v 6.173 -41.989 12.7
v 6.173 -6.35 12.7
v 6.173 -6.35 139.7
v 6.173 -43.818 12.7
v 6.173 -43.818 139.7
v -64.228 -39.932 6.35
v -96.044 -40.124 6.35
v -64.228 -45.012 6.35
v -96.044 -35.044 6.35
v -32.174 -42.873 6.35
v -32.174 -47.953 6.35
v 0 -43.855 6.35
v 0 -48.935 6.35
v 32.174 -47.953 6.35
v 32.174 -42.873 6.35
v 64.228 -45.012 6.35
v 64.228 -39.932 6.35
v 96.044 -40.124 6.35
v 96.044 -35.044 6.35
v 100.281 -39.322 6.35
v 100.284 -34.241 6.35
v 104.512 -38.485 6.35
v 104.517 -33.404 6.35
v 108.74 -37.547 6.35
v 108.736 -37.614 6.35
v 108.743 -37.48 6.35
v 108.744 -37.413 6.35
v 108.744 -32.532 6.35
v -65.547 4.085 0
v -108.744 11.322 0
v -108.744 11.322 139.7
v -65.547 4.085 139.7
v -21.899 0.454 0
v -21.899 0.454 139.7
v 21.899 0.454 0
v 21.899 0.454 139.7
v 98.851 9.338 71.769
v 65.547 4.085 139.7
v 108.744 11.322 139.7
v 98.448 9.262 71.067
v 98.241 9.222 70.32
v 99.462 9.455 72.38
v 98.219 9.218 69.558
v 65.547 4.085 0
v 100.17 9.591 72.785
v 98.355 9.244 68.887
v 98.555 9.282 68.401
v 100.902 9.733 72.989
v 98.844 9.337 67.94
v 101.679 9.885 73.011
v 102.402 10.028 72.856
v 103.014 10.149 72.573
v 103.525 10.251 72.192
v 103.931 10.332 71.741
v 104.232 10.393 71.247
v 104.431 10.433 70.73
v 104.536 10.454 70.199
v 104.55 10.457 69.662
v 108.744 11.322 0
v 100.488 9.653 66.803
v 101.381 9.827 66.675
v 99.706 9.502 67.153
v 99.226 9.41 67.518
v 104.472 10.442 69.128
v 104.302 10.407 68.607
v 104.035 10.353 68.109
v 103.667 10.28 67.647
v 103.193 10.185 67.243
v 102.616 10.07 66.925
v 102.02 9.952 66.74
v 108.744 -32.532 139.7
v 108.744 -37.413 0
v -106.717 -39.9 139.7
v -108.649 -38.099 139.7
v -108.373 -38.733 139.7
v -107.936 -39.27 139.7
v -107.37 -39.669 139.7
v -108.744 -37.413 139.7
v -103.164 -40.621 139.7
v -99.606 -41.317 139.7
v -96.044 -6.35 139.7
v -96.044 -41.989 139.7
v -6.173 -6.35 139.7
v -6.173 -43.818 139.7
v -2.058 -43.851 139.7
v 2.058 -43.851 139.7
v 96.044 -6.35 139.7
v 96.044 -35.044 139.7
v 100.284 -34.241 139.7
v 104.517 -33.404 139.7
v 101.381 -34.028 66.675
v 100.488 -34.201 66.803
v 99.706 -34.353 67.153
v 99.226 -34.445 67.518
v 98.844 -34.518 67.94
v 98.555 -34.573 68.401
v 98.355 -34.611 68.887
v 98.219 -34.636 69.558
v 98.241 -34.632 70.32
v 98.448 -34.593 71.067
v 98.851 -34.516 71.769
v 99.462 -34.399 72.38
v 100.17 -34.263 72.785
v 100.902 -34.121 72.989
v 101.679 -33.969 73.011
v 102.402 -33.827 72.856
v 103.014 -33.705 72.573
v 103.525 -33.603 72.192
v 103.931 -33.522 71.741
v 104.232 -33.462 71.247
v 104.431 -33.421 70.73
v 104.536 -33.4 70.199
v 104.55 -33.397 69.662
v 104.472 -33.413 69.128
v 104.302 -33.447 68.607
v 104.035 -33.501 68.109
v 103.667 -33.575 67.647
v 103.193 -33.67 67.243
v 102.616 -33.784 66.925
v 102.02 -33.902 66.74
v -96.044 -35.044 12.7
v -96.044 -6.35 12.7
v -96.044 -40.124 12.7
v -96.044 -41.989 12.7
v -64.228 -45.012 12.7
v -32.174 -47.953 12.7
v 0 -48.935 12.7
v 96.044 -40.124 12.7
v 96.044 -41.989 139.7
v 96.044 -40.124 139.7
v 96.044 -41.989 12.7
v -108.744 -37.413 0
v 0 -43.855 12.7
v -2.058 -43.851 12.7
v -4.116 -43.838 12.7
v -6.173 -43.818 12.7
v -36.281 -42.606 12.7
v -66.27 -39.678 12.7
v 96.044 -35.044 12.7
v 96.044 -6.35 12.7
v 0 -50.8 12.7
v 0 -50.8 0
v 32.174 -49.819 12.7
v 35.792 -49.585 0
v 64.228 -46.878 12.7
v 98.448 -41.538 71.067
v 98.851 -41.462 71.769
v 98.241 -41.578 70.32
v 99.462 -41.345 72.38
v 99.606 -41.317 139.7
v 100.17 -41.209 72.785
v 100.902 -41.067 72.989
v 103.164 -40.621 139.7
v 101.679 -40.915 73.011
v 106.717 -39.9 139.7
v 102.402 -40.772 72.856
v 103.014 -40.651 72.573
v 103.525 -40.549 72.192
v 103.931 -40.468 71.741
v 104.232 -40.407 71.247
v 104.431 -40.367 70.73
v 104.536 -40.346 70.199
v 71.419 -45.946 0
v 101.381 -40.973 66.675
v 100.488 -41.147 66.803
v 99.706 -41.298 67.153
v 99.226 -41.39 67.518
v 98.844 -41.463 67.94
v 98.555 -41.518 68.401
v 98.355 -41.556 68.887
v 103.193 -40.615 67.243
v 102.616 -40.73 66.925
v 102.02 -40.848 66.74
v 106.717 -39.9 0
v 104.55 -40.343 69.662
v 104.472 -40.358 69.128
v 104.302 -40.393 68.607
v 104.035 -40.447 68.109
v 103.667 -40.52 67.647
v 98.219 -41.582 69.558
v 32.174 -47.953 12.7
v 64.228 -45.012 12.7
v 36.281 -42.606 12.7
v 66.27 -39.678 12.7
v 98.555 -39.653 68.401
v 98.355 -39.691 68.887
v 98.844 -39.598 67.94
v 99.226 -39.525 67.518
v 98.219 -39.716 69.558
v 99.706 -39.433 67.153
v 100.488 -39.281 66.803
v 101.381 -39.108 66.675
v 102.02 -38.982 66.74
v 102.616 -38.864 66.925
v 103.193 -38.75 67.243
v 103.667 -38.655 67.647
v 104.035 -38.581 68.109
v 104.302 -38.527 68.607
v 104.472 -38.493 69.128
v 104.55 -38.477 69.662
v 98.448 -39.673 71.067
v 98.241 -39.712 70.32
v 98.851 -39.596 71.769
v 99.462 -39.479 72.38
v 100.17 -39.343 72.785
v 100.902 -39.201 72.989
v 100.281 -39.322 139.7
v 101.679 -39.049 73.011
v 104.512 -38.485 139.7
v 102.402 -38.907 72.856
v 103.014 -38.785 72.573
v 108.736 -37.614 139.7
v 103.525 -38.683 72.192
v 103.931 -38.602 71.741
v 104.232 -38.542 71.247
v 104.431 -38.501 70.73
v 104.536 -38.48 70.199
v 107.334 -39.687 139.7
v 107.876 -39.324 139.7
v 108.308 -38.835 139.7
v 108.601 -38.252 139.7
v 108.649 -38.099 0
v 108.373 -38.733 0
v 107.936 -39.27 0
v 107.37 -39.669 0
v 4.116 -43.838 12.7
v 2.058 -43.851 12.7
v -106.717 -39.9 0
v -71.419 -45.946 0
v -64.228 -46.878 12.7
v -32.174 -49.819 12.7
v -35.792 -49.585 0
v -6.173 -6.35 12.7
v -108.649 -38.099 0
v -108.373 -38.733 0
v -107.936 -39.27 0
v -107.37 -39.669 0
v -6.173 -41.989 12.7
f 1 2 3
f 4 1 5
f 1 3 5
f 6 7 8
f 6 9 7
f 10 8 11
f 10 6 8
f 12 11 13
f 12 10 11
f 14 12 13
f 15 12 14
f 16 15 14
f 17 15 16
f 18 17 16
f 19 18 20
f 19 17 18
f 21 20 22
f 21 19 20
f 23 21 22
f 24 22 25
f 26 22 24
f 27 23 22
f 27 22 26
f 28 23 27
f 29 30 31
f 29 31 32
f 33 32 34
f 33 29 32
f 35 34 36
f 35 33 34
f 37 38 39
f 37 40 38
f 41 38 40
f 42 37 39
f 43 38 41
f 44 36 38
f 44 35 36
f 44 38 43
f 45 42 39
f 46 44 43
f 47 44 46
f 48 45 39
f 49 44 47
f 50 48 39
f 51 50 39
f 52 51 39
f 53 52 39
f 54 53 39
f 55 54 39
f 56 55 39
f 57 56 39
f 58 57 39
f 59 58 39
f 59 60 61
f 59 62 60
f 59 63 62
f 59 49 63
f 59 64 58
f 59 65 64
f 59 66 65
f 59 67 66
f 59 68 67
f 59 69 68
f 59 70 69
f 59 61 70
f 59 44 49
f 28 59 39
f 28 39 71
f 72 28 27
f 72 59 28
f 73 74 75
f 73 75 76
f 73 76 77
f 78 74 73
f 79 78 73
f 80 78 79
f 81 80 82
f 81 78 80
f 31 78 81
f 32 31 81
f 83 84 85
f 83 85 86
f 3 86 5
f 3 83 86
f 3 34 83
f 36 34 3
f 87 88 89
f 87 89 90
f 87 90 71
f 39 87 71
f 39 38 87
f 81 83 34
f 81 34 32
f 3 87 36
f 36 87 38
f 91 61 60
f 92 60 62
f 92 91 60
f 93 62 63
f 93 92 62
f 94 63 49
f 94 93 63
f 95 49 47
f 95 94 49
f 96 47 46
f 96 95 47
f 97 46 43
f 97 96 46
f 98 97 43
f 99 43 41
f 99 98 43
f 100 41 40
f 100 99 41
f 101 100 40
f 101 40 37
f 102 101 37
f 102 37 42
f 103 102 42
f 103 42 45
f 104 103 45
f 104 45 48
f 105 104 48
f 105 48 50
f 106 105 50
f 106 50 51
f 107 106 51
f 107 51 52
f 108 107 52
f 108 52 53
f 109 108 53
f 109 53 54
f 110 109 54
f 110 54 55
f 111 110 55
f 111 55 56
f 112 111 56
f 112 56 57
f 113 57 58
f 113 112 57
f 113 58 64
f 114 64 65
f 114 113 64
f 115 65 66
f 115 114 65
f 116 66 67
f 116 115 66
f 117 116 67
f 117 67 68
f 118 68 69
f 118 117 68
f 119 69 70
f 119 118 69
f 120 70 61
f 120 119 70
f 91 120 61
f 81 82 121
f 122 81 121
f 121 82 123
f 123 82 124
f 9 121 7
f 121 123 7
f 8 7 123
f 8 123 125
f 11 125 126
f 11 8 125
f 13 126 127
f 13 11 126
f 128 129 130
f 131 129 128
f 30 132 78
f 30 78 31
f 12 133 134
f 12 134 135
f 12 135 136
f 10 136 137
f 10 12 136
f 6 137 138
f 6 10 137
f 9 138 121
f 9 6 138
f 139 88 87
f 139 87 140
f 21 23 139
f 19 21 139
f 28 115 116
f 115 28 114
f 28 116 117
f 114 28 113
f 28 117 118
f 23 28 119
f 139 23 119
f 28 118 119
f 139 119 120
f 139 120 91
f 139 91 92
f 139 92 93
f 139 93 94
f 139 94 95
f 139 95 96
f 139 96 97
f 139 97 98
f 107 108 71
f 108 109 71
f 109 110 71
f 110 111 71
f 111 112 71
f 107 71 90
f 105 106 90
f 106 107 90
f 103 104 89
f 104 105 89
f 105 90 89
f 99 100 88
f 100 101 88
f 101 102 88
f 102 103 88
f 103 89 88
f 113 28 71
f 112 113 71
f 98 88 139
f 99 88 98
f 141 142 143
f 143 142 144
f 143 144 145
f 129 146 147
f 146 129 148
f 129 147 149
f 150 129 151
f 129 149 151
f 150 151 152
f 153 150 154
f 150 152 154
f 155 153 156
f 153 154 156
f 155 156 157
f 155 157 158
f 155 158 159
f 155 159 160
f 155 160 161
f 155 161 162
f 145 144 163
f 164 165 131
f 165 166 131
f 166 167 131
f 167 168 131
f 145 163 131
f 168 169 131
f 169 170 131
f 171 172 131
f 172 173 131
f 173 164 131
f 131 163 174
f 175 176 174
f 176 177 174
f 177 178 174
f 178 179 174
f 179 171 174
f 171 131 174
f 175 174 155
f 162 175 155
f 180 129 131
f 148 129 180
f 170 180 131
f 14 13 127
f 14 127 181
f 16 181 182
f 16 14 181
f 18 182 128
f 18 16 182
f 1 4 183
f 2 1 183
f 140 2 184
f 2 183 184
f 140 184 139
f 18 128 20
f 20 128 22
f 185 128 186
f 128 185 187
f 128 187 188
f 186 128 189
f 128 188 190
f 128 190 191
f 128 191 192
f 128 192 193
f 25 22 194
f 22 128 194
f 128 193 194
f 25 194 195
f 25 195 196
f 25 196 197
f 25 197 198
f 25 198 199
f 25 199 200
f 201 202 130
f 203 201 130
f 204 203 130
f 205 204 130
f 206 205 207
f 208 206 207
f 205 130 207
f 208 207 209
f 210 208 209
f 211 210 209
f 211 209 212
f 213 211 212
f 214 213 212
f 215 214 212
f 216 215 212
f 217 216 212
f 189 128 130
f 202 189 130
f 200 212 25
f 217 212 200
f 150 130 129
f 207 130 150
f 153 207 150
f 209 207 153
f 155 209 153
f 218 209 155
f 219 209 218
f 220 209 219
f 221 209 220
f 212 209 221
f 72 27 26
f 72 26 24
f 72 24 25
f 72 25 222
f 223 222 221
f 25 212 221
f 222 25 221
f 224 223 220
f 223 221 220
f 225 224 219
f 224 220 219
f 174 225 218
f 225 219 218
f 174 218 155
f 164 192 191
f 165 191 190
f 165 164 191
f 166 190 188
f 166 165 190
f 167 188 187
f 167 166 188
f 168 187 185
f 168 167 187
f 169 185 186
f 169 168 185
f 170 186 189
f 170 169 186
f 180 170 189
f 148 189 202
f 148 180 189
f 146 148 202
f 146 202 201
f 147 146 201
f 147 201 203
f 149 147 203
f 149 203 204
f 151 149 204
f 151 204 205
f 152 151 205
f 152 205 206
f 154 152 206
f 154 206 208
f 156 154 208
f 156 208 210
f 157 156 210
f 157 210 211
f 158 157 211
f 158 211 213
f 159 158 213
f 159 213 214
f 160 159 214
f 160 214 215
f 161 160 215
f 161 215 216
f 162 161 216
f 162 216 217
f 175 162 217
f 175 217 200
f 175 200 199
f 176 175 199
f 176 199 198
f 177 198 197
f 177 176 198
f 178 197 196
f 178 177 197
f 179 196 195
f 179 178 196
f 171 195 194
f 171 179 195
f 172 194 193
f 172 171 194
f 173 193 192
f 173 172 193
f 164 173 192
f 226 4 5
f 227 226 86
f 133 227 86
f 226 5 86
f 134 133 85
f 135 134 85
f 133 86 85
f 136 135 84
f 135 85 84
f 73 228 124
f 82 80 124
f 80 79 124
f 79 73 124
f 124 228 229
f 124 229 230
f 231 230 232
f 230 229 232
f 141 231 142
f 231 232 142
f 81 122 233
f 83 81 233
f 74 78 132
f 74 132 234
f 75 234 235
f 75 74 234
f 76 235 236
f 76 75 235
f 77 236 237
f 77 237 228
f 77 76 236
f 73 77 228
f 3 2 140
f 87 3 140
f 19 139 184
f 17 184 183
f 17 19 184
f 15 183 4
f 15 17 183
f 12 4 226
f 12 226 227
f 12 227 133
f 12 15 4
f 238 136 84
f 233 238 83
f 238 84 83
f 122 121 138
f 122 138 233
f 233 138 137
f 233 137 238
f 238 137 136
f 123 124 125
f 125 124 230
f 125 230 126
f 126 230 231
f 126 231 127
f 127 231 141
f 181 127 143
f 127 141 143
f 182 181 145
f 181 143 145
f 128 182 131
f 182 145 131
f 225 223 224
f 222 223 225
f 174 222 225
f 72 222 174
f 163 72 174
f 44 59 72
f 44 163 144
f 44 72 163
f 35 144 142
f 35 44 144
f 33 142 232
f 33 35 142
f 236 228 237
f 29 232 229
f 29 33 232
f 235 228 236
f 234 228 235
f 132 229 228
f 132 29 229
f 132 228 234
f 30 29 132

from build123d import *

# Parameters (mm, degrees)
BOSS_EXTRUDE2_DEPTH     = 279.4
CUT_EXTRUDE1_DEPTH      = 279.4
FILLET1_R               = 2.54
SKETCH7_W               = 192.0875
SKETCH7_H               = 254
CUT_EXTRUDE2_DEPTH      = 44.45
SKETCH8_W               = 6.173248721
SKETCH8_H               = 35.639061591
BOSS_EXTRUDE3_DEPTH     = 258.064
CUT_EXTRUDE3_DEPTH      = 260.35
CUT_EXTRUDE3_DEPTH_BACK = 6.35
CUT_EXTRUDE4_DEPTH      = 260.35
CUT_EXTRUDE4_DEPTH_BACK = 6.35
BOSS_EXTRUDE4_DEPTH     = 254
SKETCH18_R              = 3.175
CUT_EXTRUDE5_DEPTH      = 71.12


with BuildPart() as part:
    # CrossSection → Boss-Extrude2 (new body)
    with BuildSketch(Plane.XY):
        with BuildLine():
            Line((108.74375, 11.322324676), (108.74375, -50.8))
            Line((108.74375, -50.8), (-108.74375, -50.8))
            Line((-108.74375, -50.8), (-108.74375, 11.322324676))
            ThreePointArc((-108.74375, 11.322324676), (0, 0), (108.74375, 11.322324676))
        make_face()
    extrude(amount=BOSS_EXTRUDE2_DEPTH)

    # Sketch4 → Cut-Extrude1 (cut)
    with BuildSketch(Plane(origin=(0, 0, 0), x_dir=(-1, 0, 0), z_dir=(0, 0, -1))):
        with BuildLine():
            ThreePointArc((0, -50.8), (-54.665798723, -47.96178867), (-108.74375, -39.477675324))
            Line((-108.74375, -39.477675324), (-108.74375, -50.8))
            Line((-108.74375, -50.8), (0, -50.8))
        make_face()
        with BuildLine():
            ThreePointArc((108.74375, -39.477675324), (54.665798723, -47.96178867), (0, -50.8))
            Line((0, -50.8), (108.74375, -50.8))
            Line((108.74375, -50.8), (108.74375, -39.477675324))
        make_face()
    extrude(amount=-CUT_EXTRUDE1_DEPTH, mode=Mode.SUBTRACT)

    # Fillet1
    fillet1_edges = [part.edges().sort_by_distance(p)[0] for p in [
        (108.74375, -39.477675324, 139.7),
        (-108.74375, -39.477675324, 139.7),
    ]]
    fillet(fillet1_edges, radius=FILLET1_R)

    # Sketch7 → Cut-Extrude2 (cut)
    with BuildSketch(Plane(origin=(0, -50.8, 0), x_dir=(1, 0, 0), z_dir=(0, 1, 0))):
        with Locations((0, -139.7)):
            Rectangle(SKETCH7_W, SKETCH7_H)
    extrude(amount=CUT_EXTRUDE2_DEPTH, mode=Mode.SUBTRACT)

    # Sketch8 → Boss-Extrude3 (add)
    with BuildSketch(Plane.XY.offset(12.7)):
        with Locations((3.086624361, -24.169530796)):
            Rectangle(SKETCH8_W, SKETCH8_H)
        with Locations((-3.086624361, -24.169530796)):
            Rectangle(SKETCH8_W, SKETCH8_H)
    extrude(amount=BOSS_EXTRUDE3_DEPTH)

    # Sketch13 → Cut-Extrude3 (cut, two sides: drawn at the far end of the back side and taken through both)
    with BuildSketch(Plane.XY.offset(12.7).offset(-CUT_EXTRUDE3_DEPTH_BACK)):
        with BuildLine():
            ThreePointArc((-96.04375, -40.123592373), (-48.223527841, -46.727181022), (0, -48.934530782))
            Line((0, -48.934530782), (0, -43.854530782))
            ThreePointArc((0, -43.854530782), (-48.223527841, -41.647181022), (-96.04375, -35.043592373))
            Line((-96.04375, -35.043592373), (-96.04375, -37.583592373))
            Line((-96.04375, -37.583592373), (-96.04375, -40.123592373))
        make_face()
        with BuildLine():
            Line((0, -43.854530782), (0, -48.934530782))
            ThreePointArc((0, -48.934530782), (48.223527841, -46.727181022), (96.04375, -40.123592373))
            Line((96.04375, -40.123592373), (96.04375, -37.583592373))
            Line((96.04375, -37.583592373), (96.04375, -35.043592373))
            ThreePointArc((96.04375, -35.043592373), (48.223527841, -41.647181022), (0, -43.854530782))
        make_face()
    extrude(amount=CUT_EXTRUDE3_DEPTH + CUT_EXTRUDE3_DEPTH_BACK, mode=Mode.SUBTRACT)

    # Sketch14 → Cut-Extrude4 (cut, two sides: drawn at the far end of the back side and taken through both)
    with BuildSketch(Plane(origin=(0, 0, 266.7), x_dir=(-1, 0, 0), z_dir=(0, 0, -1)).offset(-CUT_EXTRUDE4_DEPTH_BACK)):
        with BuildLine():
            Line((96.04375, -35.043592373), (96.04375, -40.123592373))
            ThreePointArc((96.04375, -40.123592373), (-28.026510339, -48.189989717), (-150.541934286, -27.012946445))
            Line((-150.541934286, -27.012946445), (-150.541934286, -21.932946445))
            ThreePointArc((-150.541934286, -21.932946445), (-28.026510339, -43.109989717), (96.04375, -35.043592373))
        make_face()
    extrude(amount=CUT_EXTRUDE4_DEPTH + CUT_EXTRUDE4_DEPTH_BACK, mode=Mode.SUBTRACT)

    # Sketch15 → Boss-Extrude4 (add)
    with BuildSketch(Plane(origin=(0, 0, 266.7), x_dir=(-1, 0, 0), z_dir=(0, 0, -1))):
        with BuildLine():
            Line((6.173248721, -43.818432493), (6.173248721, -41.989061591))
            Line((6.173248721, -41.989061591), (-6.173248721, -41.989061591))
            Line((-6.173248721, -41.989061591), (-6.173248721, -43.818432493))
            ThreePointArc((-6.173248721, -43.818432493), (0, -43.854530782), (6.173248721, -43.818432493))
        make_face()
    extrude(amount=BOSS_EXTRUDE4_DEPTH)

    # Sketch18 → Cut-Extrude5 (cut)
    with BuildSketch(Plane(origin=(0, -50.8, 0), x_dir=(1, 0, 0), z_dir=(0, 1, 0))):
        with Locations(Location((101.380501252, -209.55, 0), (0, 0, 90))):
            Circle(SKETCH18_R)
        with Locations(Location((101.380501252, -69.85, 0), (0, 0, 90))):
            Circle(SKETCH18_R)
    extrude(amount=CUT_EXTRUDE5_DEPTH, mode=Mode.SUBTRACT)


with BuildPart() as body_2:
    # Split2: the piece on the far side of the plane
    add(part.part)
    split(bisect_by=Plane.XY.offset(139.7), keep=Keep.BOTTOM)


with BuildPart() as part_1:
    add(part.part)

    # Split2
    split(bisect_by=Plane.XY.offset(139.7), keep=Keep.TOP)


solid = body_2.part
